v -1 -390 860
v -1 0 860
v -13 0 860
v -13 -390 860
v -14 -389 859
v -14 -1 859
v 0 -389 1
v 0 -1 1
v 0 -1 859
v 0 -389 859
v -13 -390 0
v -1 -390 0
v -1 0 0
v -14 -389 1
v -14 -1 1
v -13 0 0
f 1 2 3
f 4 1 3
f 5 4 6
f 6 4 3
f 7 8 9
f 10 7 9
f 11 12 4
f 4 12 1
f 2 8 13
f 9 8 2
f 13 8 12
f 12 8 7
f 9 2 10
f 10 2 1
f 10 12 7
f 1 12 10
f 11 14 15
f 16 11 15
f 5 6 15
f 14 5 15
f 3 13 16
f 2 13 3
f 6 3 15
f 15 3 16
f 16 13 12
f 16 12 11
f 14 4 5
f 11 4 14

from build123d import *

# Parameters (mm, degrees)
F0_W     = 55.4160475731
F0_H     = 42.9720431566
F1_DEPTH = 14
F2_DEPTH = 1060
F3_DEPTH = 390
F4_DEPTH = 200
F5_SIZE  = 1


with BuildPart() as f1:
    # F0 (on Right) → F1 (new body)
    with BuildSketch(Plane.YZ):
        with Locations((-27.7080237865, 21.4860215783)):
            Rectangle(F0_W, F0_H)
    extrude(amount=-F1_DEPTH)

    # F2 (add): a face of the model
    f2_faces = [f1.faces().sort_by_distance(p)[0] for p in [
        (-7, -27.7080237865, 0),
    ]]
    extrude(f2_faces, amount=-F2_DEPTH)

    # F3 (add): a face of the model
    f3_faces = [f1.faces().sort_by_distance(p)[0] for p in [
        (-7, 0, 530),
    ]]
    extrude(f3_faces, amount=-F3_DEPTH)

    # F4 (cut): a face of the model
    f4_faces = [f1.faces().sort_by_distance(p)[0] for p in [
        (-7, -195, 1060),
    ]]
    extrude(f4_faces, amount=-F4_DEPTH, mode=Mode.SUBTRACT)

    # F5
    f5_edges = [f1.edges().sort_by_distance(p)[0] for p in [
        (0, -195, 0),
        (0, -390, 430),
        (0, -195, 860),
        (0, 0, 430),
        (-14, -195, 0),
        (-14, -390, 430),
        (-14, -195, 860),
        (-14, 0, 430),
    ]]
    chamfer(f5_edges, length=F5_SIZE)


solid = f1.part
